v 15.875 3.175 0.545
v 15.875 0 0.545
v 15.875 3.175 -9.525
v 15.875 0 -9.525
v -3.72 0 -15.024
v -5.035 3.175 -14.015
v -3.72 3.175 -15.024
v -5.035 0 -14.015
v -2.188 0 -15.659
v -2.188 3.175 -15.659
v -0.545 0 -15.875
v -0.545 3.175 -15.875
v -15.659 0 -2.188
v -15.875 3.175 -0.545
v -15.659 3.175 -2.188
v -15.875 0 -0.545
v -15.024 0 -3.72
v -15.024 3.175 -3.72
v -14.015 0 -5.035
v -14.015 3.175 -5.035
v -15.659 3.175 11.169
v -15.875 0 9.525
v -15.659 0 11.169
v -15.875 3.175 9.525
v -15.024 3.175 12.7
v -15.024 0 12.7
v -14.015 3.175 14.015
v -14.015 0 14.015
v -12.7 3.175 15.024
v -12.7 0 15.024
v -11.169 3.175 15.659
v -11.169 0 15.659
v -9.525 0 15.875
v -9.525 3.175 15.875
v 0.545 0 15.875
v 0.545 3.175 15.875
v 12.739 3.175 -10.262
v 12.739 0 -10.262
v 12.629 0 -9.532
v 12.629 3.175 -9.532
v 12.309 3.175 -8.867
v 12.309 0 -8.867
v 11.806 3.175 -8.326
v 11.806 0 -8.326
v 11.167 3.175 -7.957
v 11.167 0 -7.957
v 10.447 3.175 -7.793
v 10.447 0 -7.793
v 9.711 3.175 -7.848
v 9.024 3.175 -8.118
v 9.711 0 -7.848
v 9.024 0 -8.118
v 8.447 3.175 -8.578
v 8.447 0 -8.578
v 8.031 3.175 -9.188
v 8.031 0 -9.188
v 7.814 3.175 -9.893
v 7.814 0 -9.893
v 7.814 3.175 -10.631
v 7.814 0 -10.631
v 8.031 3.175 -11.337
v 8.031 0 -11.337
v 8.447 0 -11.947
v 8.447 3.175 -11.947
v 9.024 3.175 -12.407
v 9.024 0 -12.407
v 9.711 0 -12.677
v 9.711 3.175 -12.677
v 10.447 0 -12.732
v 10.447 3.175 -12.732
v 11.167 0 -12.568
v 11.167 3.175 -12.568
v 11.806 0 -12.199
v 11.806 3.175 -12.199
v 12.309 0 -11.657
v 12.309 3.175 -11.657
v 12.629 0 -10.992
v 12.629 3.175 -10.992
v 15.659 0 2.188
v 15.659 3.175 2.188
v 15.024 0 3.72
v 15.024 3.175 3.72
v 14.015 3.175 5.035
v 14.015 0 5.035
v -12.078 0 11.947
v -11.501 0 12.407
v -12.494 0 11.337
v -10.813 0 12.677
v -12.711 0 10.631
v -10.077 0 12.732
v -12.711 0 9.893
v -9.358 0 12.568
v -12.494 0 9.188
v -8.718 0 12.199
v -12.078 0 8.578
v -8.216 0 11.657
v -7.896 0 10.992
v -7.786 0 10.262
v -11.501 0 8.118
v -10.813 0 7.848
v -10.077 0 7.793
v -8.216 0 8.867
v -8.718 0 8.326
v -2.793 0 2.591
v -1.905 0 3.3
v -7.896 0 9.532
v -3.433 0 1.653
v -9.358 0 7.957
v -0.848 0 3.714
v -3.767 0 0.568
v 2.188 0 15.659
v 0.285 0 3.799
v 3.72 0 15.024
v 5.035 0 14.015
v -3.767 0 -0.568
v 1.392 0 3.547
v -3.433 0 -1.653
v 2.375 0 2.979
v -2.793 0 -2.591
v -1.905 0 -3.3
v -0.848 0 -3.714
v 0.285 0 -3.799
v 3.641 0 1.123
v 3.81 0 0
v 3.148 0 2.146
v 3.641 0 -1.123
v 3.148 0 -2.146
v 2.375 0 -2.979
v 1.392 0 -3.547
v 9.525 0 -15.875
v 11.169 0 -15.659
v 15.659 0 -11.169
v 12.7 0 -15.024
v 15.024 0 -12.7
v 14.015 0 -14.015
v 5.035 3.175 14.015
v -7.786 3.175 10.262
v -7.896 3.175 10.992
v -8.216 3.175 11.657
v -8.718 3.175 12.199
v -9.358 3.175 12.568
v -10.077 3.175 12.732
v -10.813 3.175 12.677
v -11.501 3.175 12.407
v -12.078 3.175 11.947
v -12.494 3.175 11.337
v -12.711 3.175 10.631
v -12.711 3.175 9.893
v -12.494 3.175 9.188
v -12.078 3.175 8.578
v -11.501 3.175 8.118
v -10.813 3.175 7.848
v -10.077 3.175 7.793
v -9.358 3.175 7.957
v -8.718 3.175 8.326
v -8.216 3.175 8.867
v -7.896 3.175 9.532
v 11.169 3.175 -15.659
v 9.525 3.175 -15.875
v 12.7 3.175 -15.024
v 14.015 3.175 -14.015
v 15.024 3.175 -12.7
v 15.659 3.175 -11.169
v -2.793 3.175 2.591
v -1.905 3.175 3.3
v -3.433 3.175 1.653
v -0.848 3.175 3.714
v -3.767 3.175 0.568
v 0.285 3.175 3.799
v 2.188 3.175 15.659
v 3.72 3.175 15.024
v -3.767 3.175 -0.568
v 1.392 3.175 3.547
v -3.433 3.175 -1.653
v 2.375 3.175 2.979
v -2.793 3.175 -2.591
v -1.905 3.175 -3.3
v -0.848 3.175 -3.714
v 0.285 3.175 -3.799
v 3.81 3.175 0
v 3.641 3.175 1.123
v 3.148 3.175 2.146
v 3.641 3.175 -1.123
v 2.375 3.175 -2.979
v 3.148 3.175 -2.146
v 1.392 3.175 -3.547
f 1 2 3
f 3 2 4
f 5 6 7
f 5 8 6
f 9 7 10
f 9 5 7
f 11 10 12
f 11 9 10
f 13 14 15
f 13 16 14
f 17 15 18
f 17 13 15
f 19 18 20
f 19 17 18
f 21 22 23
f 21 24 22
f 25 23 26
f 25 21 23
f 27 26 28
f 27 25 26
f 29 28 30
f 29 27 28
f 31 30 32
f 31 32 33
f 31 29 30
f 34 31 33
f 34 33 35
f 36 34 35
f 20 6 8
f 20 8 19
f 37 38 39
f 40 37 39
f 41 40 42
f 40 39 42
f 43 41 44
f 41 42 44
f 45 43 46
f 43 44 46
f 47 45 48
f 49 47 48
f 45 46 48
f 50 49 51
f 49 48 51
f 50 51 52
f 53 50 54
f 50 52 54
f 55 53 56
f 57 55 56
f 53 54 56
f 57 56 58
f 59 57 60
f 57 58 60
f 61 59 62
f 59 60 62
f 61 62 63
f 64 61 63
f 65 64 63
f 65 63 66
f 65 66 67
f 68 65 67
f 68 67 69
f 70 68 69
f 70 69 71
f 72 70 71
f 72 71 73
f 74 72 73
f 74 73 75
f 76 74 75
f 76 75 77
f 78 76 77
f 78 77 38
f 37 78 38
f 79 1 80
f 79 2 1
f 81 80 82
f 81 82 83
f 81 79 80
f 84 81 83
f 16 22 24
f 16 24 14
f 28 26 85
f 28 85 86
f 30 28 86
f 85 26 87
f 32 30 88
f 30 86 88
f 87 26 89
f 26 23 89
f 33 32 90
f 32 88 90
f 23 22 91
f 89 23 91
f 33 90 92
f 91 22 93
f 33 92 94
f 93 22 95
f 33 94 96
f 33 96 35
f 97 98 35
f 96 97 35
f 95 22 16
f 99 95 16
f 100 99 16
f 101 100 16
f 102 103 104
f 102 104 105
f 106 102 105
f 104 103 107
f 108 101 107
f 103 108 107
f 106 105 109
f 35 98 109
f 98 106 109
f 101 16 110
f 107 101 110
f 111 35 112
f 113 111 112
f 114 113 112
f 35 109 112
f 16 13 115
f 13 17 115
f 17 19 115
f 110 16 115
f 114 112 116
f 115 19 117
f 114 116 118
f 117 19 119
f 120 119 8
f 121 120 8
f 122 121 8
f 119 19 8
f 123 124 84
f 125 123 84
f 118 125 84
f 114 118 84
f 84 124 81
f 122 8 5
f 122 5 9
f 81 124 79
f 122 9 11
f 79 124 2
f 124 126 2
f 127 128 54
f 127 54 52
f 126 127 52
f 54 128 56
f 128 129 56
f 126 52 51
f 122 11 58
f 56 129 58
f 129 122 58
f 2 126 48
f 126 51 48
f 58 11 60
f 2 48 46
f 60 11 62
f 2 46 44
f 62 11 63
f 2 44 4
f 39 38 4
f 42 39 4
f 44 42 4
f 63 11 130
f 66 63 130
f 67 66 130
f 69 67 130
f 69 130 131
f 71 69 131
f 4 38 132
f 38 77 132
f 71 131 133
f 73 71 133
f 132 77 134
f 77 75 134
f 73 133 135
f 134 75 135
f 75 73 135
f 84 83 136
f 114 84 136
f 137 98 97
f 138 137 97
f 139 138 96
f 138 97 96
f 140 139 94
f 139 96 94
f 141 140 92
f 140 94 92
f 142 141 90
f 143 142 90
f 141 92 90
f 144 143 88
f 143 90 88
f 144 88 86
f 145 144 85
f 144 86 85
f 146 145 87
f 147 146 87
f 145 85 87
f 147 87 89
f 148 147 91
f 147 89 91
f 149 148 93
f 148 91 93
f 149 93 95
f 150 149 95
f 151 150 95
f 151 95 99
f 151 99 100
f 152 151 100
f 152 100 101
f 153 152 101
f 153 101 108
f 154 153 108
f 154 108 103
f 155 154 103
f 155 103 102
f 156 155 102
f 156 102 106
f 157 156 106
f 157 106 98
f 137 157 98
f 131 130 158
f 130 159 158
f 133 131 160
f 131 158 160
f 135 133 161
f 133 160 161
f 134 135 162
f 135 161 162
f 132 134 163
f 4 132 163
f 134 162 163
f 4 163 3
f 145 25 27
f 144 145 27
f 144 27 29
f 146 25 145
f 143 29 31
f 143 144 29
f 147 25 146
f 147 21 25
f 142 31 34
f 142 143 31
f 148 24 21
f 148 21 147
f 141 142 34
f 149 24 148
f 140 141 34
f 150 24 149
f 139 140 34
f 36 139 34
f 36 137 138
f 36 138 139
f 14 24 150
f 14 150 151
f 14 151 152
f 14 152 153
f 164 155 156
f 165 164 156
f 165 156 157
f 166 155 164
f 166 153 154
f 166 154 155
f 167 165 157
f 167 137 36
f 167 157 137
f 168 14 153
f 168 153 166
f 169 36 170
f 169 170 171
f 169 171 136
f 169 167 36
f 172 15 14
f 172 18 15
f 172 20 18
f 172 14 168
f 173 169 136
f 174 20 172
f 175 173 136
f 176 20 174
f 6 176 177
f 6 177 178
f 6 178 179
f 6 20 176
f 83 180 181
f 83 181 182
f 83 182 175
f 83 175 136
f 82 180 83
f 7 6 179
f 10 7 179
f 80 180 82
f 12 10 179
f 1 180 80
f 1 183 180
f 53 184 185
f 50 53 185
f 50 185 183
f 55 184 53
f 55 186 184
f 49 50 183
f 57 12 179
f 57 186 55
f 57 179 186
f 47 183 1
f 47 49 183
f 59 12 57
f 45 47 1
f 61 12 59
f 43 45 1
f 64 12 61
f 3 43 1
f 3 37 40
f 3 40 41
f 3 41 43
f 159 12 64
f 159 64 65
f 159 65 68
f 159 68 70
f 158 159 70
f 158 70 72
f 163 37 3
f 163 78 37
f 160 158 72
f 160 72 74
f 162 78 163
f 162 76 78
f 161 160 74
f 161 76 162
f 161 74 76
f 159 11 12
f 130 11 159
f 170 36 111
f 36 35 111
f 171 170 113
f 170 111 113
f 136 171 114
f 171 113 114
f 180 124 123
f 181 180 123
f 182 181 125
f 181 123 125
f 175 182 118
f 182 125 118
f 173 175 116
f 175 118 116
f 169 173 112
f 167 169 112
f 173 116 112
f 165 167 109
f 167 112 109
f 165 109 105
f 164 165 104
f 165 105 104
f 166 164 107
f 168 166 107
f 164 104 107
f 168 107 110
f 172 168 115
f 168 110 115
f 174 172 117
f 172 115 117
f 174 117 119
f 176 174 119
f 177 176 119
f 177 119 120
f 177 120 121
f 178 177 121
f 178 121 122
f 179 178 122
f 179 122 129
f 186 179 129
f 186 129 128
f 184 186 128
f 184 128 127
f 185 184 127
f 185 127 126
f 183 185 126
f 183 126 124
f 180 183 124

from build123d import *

# Parameters (mm, degrees)
SKETCH1_W           = 31.75
SKETCH1_H           = 31.75
BOSS_EXTRUDE1_DEPTH = 3.175
SKETCH3_R           = 2.4765
CUT_EXTRUDE2_DEPTH  = 4.175
SKETCH2_R           = 3.81
CUT_EXTRUDE4_DEPTH  = 4.175
CUT_EXTRUDE5_DEPTH  = 4.175
FILLET1_R           = 6.35


with BuildPart() as part:
    # Sketch1 → Boss-Extrude1 (new body)
    with BuildSketch(Plane(origin=(0, 0, 0), x_dir=(1, 0, 0), z_dir=(0, 1, 0))):
        Rectangle(SKETCH1_W, SKETCH1_H)
    extrude(amount=BOSS_EXTRUDE1_DEPTH)

    # Sketch3 → Cut-Extrude2 (cut, through all)
    with BuildSketch(Plane.XZ):
        with Locations((-10.262339924, 10.262339924)):
            Circle(SKETCH3_R)
        with Locations((10.262339924, -10.262339924)):
            Circle(SKETCH3_R)
    extrude(amount=-CUT_EXTRUDE2_DEPTH, mode=Mode.SUBTRACT)

    # Sketch2 → Cut-Extrude4 (cut, through all)
    with BuildSketch(Plane.XZ):
        Circle(SKETCH2_R)
    extrude(amount=-CUT_EXTRUDE4_DEPTH, mode=Mode.SUBTRACT)

    # Sketch4 → Cut-Extrude5 (cut, through all)
    with BuildSketch(Plane(origin=(0, 3.175, 0), x_dir=(1, 0, 0), z_dir=(0, 1, 0))):
        Polygon((-15.875, 15.875), (-3.175, 15.875), (-15.875, 3.175), align=None)
        Polygon((15.875, -15.875), (15.875, -3.175), (3.175, -15.875), align=None)
    extrude(amount=-CUT_EXTRUDE5_DEPTH, mode=Mode.SUBTRACT)

    # Fillet1
    fillet1_edges = [part.edges().sort_by_distance(p)[0] for p in [
        (-15.875, 1.5875, -3.175),
        (-3.175, 1.5875, -15.875),
        (3.175, 1.5875, 15.875),
        (15.875, 1.5875, 3.175),
        (-15.875, 1.5875, 15.875),
        (15.875, 1.5875, -15.875),
    ]]
    fillet(fillet1_edges, radius=FILLET1_R)


solid = part.part
